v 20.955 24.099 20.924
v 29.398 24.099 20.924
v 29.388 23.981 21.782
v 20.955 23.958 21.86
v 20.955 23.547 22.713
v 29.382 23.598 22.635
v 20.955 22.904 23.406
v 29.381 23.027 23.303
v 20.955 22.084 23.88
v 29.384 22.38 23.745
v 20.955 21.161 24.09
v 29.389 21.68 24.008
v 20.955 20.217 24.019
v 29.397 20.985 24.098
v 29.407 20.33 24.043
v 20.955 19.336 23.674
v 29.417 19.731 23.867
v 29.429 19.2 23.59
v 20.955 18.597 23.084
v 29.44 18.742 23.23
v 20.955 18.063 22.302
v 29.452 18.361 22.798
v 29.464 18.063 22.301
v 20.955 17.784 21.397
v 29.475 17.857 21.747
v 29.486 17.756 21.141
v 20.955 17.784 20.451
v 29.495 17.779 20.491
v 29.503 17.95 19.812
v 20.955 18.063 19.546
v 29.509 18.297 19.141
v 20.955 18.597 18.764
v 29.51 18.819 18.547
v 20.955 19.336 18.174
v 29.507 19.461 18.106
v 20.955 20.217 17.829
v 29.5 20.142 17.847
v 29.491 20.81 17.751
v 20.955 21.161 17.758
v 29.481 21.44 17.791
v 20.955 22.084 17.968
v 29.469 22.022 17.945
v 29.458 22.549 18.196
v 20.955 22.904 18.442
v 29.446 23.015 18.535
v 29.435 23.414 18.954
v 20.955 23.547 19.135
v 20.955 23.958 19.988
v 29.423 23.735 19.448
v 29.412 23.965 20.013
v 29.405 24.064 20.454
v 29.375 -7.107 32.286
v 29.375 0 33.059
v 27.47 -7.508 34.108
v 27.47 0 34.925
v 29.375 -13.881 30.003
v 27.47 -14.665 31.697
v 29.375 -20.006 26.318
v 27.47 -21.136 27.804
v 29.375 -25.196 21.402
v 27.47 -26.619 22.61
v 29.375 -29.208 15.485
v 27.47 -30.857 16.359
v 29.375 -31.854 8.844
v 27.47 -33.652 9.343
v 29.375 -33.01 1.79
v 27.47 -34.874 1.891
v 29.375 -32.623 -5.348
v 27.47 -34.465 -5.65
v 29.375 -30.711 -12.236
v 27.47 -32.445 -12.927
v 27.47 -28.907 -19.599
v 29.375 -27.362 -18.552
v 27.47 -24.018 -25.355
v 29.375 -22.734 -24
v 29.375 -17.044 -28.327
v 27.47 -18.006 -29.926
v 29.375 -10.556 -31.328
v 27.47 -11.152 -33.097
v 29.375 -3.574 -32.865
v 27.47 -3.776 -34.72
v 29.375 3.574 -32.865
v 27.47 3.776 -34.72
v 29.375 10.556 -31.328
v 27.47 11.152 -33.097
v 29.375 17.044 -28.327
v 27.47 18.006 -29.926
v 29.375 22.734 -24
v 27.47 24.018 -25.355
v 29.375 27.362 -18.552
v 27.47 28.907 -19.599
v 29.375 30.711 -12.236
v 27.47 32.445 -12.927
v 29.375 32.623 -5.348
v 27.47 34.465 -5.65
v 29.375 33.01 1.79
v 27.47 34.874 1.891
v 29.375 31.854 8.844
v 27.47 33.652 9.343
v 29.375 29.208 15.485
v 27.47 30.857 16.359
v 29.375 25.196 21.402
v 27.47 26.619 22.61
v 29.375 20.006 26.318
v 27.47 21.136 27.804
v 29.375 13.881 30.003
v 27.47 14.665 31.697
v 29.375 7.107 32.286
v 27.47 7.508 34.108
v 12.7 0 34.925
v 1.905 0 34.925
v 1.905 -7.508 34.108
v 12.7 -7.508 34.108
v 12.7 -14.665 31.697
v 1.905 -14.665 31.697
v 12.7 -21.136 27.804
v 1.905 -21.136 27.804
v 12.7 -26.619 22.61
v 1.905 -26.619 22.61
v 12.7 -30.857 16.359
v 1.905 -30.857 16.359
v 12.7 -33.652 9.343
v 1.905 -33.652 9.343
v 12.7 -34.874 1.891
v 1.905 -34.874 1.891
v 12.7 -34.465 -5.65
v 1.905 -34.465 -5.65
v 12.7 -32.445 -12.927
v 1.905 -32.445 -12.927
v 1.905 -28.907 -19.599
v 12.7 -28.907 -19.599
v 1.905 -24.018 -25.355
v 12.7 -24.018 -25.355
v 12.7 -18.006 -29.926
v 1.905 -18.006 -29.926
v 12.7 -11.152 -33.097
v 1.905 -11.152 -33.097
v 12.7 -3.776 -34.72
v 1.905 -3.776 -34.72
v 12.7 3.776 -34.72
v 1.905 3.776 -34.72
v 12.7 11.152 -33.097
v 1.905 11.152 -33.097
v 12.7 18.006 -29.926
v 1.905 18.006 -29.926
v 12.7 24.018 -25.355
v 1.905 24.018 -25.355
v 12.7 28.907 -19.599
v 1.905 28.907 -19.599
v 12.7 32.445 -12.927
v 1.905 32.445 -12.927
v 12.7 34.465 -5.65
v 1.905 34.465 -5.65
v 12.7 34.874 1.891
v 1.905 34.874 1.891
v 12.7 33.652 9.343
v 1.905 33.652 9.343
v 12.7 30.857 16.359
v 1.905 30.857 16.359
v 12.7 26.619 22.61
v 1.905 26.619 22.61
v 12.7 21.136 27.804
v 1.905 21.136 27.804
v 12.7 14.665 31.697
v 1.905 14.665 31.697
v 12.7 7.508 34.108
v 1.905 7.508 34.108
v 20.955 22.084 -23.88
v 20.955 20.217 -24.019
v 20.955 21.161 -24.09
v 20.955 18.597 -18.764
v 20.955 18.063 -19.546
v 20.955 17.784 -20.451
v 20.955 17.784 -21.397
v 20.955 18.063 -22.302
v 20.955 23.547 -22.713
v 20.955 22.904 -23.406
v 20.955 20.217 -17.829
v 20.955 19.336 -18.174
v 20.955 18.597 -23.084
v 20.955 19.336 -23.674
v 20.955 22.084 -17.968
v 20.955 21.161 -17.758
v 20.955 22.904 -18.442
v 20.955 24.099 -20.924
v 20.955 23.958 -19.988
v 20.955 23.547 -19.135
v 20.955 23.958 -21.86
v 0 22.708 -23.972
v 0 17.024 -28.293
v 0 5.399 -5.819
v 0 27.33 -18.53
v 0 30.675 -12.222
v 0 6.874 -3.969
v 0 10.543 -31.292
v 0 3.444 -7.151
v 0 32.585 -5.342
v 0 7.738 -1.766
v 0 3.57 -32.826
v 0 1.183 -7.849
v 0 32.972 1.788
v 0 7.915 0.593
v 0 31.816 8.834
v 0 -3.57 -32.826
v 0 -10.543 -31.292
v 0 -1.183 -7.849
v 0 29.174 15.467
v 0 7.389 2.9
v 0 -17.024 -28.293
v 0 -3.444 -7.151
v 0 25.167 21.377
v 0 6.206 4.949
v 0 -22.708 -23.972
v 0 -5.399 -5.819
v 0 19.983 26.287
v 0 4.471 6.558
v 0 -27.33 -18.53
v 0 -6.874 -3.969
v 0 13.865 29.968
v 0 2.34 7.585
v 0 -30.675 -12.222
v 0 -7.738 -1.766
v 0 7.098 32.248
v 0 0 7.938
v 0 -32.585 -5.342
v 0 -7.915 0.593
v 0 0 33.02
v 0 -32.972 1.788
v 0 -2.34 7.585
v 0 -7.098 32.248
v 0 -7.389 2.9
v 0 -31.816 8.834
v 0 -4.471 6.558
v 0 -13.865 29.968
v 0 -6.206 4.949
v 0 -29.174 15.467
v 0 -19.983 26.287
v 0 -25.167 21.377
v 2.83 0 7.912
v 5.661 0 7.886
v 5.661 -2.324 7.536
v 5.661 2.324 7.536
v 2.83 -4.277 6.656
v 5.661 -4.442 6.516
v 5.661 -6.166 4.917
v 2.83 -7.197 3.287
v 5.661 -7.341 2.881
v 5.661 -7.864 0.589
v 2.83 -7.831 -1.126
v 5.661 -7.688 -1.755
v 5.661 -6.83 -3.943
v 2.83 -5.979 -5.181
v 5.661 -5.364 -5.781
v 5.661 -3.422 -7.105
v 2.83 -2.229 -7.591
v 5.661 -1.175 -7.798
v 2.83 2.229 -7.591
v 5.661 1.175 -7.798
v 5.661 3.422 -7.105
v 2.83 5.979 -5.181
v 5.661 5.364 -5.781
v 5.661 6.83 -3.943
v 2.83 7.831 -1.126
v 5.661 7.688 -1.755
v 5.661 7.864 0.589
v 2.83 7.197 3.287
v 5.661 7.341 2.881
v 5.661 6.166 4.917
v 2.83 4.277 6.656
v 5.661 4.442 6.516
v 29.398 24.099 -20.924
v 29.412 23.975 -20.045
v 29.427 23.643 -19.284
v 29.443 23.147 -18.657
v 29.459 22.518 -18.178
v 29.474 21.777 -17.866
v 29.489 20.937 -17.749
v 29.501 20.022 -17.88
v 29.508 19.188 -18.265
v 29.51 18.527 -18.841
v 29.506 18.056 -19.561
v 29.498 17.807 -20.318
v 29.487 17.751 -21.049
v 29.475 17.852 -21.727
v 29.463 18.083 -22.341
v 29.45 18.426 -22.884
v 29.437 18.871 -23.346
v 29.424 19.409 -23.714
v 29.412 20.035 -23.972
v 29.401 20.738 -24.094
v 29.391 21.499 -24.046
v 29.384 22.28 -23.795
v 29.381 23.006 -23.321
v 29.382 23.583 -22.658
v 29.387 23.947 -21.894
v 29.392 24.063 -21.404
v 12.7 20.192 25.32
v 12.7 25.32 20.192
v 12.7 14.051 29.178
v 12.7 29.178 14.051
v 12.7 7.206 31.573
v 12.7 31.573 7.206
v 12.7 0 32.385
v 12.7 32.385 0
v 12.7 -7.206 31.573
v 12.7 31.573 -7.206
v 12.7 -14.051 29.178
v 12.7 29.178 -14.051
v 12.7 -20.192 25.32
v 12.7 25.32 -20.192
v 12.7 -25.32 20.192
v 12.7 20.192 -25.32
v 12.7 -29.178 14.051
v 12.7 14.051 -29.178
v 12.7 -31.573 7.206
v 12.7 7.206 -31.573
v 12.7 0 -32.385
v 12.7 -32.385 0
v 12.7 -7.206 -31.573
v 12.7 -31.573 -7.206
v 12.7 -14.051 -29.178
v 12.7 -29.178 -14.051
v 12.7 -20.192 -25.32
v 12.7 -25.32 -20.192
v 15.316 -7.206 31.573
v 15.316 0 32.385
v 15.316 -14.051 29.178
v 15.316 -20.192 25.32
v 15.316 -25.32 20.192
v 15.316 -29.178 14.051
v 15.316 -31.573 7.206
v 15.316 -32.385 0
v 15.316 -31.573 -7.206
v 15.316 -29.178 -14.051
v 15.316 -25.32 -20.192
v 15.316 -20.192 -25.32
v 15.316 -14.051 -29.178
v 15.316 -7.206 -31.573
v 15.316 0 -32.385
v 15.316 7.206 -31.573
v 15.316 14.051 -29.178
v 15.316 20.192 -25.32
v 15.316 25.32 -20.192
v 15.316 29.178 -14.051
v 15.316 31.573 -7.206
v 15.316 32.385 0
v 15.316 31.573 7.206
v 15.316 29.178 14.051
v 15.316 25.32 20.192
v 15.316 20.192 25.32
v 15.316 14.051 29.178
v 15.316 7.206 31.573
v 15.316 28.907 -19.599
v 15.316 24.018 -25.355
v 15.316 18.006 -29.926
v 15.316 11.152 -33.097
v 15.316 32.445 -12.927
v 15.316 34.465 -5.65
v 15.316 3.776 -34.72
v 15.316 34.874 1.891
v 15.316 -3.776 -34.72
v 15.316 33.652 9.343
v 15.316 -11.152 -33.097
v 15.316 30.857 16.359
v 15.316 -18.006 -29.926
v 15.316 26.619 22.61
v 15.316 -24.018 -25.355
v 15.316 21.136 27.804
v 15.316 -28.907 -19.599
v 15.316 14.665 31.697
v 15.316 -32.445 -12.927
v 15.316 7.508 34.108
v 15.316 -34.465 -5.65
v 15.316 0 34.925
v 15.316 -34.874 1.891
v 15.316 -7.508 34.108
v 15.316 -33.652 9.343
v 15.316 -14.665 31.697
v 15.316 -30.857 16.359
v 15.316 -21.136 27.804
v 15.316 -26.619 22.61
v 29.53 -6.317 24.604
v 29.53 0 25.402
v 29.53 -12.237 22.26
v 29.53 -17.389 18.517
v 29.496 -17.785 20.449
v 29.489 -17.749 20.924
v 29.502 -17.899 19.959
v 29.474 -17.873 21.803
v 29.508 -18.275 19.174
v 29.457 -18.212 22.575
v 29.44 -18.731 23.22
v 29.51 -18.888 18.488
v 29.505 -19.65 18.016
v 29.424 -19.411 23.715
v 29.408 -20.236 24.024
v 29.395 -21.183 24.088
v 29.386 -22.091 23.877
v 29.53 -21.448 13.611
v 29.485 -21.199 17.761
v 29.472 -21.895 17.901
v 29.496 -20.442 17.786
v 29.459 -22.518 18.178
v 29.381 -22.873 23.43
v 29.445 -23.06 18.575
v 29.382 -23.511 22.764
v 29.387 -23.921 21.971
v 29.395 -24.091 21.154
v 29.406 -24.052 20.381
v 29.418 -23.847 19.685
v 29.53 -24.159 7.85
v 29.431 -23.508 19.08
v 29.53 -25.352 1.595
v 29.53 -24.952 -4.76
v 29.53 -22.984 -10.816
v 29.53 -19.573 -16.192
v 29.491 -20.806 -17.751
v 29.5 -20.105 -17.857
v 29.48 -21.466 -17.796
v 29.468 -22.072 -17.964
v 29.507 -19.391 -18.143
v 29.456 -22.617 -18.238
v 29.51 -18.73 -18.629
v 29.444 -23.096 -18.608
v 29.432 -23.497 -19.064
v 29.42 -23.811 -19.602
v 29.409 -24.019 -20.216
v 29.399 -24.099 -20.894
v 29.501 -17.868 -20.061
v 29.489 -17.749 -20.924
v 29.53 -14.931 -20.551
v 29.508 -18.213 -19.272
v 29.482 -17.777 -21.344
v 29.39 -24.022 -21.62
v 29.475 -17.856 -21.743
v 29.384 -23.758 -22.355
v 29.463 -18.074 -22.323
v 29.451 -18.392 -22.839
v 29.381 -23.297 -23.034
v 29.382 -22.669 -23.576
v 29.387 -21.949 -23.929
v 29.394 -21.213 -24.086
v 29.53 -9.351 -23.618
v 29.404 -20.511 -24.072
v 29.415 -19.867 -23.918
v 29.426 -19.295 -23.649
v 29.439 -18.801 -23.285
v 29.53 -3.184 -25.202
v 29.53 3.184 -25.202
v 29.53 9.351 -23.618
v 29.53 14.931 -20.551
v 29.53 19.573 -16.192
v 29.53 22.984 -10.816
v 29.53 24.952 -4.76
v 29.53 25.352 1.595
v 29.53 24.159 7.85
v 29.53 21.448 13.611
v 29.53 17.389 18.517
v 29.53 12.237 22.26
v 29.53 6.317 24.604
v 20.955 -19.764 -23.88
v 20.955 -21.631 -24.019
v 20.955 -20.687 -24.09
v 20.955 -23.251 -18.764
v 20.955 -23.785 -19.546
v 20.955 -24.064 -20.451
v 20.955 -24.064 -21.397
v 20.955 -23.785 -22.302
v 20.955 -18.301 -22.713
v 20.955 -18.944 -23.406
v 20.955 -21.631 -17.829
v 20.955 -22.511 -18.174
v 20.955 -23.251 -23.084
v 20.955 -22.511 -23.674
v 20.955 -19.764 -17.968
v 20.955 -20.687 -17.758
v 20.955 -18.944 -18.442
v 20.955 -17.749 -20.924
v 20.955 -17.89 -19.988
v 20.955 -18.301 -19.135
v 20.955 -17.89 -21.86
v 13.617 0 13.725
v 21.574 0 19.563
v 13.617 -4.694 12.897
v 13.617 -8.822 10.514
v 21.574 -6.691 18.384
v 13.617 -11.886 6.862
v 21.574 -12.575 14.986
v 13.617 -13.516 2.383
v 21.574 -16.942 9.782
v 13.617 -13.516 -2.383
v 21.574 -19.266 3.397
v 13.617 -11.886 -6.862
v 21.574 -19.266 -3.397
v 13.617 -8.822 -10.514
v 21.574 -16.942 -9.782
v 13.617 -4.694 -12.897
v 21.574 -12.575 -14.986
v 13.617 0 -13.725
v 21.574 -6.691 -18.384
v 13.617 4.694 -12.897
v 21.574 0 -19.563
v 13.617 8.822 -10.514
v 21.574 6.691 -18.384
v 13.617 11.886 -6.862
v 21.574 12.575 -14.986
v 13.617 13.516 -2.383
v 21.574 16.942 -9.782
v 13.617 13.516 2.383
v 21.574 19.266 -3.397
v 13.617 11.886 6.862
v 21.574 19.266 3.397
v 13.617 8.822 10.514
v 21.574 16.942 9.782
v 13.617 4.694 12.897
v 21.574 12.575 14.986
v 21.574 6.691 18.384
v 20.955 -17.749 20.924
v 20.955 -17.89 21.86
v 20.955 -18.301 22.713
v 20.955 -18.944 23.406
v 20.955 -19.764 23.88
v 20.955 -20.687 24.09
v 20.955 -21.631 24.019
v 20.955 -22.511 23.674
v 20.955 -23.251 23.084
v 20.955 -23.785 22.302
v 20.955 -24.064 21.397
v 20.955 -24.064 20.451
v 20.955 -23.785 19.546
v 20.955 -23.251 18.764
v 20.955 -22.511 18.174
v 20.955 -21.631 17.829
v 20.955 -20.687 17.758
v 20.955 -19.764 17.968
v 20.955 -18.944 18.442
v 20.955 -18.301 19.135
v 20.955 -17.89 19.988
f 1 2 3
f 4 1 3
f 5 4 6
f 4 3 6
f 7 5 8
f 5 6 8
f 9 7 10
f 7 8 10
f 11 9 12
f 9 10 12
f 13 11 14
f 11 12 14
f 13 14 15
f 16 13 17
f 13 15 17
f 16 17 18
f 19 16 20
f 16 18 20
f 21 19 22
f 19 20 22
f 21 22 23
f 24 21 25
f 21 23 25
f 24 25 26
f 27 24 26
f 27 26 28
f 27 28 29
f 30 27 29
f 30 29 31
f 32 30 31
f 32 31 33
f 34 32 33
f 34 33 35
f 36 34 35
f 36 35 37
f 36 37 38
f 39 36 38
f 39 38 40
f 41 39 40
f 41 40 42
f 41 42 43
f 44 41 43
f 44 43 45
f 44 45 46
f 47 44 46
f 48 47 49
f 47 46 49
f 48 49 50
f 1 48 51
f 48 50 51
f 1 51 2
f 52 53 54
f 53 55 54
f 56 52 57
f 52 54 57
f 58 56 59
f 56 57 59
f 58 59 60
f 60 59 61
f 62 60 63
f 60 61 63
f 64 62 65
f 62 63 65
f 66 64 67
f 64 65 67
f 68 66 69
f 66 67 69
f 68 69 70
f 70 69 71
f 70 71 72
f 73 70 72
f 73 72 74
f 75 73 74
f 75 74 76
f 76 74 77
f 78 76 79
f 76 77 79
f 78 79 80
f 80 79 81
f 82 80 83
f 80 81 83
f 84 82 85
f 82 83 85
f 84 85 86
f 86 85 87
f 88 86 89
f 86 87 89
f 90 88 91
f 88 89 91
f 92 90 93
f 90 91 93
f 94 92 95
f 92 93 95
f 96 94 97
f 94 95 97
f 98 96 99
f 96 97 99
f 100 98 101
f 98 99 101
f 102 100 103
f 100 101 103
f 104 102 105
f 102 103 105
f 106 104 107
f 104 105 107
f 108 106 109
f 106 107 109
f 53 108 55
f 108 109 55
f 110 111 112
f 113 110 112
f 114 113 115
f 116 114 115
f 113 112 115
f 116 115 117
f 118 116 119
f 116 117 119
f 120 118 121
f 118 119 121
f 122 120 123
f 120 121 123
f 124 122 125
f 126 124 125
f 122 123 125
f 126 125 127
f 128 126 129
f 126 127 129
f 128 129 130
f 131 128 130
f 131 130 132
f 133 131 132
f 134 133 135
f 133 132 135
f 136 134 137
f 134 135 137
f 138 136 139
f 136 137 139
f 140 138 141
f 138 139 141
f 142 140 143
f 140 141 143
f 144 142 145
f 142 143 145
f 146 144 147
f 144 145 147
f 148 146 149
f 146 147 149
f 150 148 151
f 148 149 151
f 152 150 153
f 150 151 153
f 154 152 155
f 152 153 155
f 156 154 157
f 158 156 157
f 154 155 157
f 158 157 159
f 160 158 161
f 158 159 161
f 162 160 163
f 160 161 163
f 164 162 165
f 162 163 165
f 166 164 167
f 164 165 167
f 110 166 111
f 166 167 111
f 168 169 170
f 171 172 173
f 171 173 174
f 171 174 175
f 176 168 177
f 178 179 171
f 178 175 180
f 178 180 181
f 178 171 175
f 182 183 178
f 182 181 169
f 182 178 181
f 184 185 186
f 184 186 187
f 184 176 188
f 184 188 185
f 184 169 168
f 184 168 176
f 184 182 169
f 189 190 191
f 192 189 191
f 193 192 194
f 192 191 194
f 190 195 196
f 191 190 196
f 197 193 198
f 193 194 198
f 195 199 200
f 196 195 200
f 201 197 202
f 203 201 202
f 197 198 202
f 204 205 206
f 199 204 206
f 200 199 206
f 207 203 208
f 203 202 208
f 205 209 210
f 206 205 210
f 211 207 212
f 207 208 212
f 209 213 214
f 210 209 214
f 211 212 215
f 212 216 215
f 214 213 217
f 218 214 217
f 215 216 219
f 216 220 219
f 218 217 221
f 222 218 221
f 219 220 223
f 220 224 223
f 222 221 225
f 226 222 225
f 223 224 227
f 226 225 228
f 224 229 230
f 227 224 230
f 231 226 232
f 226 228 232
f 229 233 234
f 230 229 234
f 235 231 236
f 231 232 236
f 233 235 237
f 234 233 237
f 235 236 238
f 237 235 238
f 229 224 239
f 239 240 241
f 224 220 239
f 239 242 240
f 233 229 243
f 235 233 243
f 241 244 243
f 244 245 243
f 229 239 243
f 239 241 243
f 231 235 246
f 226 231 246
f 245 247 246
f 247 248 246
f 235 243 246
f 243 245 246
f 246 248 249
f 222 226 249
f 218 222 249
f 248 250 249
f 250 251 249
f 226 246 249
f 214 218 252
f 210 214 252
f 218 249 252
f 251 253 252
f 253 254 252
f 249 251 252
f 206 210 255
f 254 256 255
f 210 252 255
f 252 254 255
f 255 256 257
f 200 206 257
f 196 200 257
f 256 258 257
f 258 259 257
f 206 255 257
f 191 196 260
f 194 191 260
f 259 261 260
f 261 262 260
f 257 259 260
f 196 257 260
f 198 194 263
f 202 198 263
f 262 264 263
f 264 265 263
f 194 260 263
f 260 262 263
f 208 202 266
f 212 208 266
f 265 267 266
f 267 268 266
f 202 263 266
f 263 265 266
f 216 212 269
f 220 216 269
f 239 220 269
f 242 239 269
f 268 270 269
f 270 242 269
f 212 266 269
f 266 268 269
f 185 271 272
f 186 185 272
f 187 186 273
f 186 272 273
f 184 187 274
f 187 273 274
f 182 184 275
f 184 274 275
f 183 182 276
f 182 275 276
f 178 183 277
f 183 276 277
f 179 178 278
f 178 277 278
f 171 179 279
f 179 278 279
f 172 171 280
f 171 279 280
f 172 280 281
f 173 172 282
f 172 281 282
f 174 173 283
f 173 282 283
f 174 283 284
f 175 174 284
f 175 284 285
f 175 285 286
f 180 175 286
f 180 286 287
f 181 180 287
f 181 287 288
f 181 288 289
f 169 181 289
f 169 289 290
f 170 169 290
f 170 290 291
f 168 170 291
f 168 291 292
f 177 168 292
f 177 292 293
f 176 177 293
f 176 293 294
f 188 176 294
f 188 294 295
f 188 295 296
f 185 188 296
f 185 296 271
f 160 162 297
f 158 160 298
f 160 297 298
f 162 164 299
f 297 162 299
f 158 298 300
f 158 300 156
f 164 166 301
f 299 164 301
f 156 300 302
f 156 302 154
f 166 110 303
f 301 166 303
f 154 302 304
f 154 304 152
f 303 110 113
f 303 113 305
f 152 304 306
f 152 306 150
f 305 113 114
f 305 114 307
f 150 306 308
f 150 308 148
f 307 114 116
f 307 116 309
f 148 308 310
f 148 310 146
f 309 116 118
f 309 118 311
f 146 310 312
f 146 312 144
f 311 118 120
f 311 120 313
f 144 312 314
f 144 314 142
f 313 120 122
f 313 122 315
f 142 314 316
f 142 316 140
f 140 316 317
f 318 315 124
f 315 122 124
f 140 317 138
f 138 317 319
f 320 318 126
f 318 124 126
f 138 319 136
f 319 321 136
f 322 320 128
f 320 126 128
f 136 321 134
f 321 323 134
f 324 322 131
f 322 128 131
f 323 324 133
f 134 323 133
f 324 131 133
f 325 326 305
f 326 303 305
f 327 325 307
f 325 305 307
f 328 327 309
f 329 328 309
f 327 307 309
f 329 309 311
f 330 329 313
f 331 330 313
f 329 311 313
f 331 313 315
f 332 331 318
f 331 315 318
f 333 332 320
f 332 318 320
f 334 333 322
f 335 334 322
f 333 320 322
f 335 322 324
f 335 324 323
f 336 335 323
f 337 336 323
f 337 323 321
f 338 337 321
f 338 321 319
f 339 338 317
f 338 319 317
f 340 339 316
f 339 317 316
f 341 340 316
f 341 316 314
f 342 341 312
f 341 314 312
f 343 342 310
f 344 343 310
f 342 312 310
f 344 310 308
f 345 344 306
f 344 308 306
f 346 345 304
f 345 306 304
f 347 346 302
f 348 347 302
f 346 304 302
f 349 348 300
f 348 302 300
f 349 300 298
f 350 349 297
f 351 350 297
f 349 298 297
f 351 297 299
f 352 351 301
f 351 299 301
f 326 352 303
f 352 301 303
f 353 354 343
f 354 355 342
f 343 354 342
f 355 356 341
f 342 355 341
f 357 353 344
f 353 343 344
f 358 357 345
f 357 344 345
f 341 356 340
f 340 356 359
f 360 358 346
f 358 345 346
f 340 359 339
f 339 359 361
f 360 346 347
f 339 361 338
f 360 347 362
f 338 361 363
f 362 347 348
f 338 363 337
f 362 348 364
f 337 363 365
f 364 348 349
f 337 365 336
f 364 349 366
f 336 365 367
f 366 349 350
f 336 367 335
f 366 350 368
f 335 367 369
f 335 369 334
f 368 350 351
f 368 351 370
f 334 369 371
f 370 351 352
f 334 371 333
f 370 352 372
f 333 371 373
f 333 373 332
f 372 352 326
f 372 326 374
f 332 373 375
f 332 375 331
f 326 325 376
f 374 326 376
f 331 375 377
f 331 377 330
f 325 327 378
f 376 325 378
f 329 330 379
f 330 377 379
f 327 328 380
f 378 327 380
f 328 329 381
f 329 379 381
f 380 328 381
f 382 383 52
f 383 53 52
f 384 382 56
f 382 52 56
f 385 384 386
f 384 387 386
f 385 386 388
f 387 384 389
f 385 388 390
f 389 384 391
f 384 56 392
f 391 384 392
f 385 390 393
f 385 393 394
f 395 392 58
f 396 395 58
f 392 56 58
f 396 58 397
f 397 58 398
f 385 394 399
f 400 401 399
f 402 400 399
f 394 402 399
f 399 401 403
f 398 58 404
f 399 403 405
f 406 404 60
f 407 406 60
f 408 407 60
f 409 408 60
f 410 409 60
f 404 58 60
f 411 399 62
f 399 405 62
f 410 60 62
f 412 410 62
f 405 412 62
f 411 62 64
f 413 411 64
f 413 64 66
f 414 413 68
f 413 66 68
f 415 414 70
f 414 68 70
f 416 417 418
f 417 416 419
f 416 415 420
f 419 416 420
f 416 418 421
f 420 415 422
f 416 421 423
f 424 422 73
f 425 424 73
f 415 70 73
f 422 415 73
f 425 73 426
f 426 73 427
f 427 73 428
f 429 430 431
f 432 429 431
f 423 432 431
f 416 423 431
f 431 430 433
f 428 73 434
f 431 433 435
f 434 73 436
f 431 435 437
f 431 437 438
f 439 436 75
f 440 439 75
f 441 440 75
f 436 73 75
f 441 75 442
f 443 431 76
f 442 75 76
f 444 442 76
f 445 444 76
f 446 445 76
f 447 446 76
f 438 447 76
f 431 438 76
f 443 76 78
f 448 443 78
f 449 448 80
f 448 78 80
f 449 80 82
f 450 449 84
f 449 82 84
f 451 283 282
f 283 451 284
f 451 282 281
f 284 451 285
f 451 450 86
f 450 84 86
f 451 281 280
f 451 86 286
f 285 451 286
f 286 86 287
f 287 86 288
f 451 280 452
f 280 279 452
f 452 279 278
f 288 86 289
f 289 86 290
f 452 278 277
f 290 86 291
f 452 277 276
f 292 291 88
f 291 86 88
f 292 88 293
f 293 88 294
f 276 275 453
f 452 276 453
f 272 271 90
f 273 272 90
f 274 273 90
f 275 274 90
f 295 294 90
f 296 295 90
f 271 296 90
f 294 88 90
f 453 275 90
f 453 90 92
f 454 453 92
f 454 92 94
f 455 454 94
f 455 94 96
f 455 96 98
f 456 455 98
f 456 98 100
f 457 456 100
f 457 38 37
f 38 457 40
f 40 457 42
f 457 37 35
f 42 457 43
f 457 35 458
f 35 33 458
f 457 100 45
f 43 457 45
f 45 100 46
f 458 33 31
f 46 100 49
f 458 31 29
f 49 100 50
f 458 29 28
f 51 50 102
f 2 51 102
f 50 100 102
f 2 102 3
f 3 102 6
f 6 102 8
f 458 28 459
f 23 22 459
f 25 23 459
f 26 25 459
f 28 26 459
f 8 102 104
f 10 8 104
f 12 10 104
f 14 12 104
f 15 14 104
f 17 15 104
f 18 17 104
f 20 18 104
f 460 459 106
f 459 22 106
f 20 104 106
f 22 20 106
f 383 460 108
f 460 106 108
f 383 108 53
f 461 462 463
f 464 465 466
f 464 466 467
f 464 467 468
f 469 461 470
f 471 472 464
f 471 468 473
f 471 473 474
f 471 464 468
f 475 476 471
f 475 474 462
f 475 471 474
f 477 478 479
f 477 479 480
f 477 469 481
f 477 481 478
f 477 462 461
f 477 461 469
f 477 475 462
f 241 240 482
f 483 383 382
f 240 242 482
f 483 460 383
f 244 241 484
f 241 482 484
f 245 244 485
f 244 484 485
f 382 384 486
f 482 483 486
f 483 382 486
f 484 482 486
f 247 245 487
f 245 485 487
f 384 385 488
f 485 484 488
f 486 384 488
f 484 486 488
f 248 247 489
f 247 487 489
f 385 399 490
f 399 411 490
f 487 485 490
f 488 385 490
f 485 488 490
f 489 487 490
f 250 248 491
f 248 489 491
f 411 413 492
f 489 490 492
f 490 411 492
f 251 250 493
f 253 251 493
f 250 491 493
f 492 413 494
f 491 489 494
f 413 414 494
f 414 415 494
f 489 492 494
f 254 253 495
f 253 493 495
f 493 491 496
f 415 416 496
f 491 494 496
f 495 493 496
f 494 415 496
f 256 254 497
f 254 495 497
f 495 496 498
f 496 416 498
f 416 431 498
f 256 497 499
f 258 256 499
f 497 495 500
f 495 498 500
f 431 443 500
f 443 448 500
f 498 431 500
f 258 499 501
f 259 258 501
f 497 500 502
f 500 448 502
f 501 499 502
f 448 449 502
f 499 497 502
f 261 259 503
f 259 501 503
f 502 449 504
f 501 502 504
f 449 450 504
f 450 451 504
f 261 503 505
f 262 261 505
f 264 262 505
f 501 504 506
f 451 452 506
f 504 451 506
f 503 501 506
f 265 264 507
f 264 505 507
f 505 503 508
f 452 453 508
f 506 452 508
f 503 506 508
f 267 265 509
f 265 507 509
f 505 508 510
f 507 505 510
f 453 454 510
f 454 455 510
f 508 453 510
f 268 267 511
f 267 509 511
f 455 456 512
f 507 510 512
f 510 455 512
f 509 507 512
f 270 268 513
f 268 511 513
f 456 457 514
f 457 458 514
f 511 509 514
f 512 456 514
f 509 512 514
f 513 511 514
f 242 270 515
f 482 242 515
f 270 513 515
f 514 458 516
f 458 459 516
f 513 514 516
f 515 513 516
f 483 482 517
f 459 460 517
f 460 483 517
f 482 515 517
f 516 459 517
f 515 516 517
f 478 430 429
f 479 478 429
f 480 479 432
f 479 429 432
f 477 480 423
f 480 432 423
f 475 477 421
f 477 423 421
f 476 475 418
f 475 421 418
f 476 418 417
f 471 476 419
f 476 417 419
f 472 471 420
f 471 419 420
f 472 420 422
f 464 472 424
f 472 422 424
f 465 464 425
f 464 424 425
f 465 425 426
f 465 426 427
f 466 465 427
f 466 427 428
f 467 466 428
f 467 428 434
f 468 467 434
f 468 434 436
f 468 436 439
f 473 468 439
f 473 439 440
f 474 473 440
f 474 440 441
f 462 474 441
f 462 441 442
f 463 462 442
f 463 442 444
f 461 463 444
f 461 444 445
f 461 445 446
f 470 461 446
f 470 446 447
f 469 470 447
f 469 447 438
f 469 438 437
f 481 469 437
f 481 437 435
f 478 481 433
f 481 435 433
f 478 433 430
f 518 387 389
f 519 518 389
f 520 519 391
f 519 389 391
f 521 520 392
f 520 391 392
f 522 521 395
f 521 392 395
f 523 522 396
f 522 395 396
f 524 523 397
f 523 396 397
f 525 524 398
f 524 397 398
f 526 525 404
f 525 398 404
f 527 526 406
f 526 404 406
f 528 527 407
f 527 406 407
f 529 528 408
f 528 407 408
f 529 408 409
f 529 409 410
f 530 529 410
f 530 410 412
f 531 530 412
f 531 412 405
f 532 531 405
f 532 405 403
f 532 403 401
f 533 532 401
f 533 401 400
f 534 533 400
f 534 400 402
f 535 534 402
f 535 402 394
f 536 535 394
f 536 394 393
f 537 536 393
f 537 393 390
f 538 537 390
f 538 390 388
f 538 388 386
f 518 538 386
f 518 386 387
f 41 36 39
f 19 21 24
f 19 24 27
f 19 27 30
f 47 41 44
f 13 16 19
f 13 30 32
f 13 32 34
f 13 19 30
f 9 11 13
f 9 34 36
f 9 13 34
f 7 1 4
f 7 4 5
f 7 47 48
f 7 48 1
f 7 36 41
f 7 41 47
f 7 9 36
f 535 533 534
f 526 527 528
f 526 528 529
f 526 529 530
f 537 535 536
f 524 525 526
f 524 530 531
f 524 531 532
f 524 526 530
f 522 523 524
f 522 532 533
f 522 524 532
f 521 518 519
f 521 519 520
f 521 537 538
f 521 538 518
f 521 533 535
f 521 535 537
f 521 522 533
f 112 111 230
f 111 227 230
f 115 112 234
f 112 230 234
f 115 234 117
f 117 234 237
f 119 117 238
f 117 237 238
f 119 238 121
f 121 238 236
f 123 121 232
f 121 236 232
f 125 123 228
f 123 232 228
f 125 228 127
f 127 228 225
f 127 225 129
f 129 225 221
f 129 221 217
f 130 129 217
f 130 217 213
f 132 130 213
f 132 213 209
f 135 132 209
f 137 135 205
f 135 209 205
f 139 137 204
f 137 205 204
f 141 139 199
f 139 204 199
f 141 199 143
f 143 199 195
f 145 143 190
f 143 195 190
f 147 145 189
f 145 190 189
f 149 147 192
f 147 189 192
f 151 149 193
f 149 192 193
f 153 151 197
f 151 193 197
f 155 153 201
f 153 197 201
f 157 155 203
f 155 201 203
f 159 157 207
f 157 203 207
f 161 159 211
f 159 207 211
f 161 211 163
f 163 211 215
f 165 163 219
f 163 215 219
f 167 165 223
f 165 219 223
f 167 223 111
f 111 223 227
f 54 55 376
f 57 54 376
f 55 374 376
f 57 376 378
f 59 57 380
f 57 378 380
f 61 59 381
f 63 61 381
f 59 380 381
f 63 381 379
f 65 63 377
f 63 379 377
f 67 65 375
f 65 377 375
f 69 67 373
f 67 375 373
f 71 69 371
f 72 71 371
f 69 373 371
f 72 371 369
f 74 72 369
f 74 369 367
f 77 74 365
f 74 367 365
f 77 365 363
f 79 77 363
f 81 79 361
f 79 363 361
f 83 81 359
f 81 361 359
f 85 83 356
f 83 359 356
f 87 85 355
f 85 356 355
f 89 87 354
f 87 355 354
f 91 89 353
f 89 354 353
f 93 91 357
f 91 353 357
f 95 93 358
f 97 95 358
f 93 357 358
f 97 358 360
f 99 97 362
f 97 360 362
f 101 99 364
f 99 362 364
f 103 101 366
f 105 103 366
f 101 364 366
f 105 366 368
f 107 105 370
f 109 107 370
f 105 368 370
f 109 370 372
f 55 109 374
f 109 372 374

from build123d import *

# Parameters (mm, degrees)
F4_R     = 3.175
F5_DEPTH = 12.7


# Not quite as in the source:
# - a fillet or chamfer that OpenCascade refuses, or shapes differently, is made with other operations: its cross-section is extruded or revolved along the edge and cut away or added


with BuildPart() as f1:
    # F0 (on Front) → F1 (revolve)
    with BuildSketch(Plane.XZ):
        Polygon((0, 7.9375), (5.6608929044, 7.8860616331), (29.5304771808, 25.4019652116), (29.337, 34.925), (15.3162, 34.925), (15.3162, 32.385), (12.7, 32.385), (12.7, 34.925), (0, 34.925), align=None)
    revolve(axis=Axis((10.2213714272, 0, 0), (1, 0, 0)))

    # F2: chamfer of 1.905 on 2 edges, made by hand

    # F2_s1 → F2_t2 (revolve, cut)
    with BuildSketch(Plane.XZ):
        Polygon((1.905, 34.925), (0, 33.02), (0, 34.925), align=None)
    revolve(axis=Axis((0, 0, 0), (1, 0, 0)), mode=Mode.SUBTRACT)

    # F2_s3 → F2_t4 (revolve, cut)
    with BuildSketch(Plane.XZ):
        Polygon((29.3749172557, 33.0586954362), (27.4703102981, 34.925), (29.337, 34.925), align=None)
    revolve(axis=Axis((29.337, 0, 0), (1, 0, 0)), mode=Mode.SUBTRACT)

    # F4 (on offset) → F5 (cut)
    with BuildSketch(Plane.YZ.offset(33.655)):
        with Locations((20.9239967621, 20.9239967621)):
            Circle(F4_R)
        with Locations((20.9239967621, -20.9239967621)):
            Circle(F4_R)
        with Locations((-20.9239967621, -20.9239967621)):
            Circle(F4_R)
        with Locations((-20.9239967621, 20.9239967621)):
            Circle(F4_R)
    extrude(amount=-F5_DEPTH, mode=Mode.SUBTRACT)


solid = f1.part
